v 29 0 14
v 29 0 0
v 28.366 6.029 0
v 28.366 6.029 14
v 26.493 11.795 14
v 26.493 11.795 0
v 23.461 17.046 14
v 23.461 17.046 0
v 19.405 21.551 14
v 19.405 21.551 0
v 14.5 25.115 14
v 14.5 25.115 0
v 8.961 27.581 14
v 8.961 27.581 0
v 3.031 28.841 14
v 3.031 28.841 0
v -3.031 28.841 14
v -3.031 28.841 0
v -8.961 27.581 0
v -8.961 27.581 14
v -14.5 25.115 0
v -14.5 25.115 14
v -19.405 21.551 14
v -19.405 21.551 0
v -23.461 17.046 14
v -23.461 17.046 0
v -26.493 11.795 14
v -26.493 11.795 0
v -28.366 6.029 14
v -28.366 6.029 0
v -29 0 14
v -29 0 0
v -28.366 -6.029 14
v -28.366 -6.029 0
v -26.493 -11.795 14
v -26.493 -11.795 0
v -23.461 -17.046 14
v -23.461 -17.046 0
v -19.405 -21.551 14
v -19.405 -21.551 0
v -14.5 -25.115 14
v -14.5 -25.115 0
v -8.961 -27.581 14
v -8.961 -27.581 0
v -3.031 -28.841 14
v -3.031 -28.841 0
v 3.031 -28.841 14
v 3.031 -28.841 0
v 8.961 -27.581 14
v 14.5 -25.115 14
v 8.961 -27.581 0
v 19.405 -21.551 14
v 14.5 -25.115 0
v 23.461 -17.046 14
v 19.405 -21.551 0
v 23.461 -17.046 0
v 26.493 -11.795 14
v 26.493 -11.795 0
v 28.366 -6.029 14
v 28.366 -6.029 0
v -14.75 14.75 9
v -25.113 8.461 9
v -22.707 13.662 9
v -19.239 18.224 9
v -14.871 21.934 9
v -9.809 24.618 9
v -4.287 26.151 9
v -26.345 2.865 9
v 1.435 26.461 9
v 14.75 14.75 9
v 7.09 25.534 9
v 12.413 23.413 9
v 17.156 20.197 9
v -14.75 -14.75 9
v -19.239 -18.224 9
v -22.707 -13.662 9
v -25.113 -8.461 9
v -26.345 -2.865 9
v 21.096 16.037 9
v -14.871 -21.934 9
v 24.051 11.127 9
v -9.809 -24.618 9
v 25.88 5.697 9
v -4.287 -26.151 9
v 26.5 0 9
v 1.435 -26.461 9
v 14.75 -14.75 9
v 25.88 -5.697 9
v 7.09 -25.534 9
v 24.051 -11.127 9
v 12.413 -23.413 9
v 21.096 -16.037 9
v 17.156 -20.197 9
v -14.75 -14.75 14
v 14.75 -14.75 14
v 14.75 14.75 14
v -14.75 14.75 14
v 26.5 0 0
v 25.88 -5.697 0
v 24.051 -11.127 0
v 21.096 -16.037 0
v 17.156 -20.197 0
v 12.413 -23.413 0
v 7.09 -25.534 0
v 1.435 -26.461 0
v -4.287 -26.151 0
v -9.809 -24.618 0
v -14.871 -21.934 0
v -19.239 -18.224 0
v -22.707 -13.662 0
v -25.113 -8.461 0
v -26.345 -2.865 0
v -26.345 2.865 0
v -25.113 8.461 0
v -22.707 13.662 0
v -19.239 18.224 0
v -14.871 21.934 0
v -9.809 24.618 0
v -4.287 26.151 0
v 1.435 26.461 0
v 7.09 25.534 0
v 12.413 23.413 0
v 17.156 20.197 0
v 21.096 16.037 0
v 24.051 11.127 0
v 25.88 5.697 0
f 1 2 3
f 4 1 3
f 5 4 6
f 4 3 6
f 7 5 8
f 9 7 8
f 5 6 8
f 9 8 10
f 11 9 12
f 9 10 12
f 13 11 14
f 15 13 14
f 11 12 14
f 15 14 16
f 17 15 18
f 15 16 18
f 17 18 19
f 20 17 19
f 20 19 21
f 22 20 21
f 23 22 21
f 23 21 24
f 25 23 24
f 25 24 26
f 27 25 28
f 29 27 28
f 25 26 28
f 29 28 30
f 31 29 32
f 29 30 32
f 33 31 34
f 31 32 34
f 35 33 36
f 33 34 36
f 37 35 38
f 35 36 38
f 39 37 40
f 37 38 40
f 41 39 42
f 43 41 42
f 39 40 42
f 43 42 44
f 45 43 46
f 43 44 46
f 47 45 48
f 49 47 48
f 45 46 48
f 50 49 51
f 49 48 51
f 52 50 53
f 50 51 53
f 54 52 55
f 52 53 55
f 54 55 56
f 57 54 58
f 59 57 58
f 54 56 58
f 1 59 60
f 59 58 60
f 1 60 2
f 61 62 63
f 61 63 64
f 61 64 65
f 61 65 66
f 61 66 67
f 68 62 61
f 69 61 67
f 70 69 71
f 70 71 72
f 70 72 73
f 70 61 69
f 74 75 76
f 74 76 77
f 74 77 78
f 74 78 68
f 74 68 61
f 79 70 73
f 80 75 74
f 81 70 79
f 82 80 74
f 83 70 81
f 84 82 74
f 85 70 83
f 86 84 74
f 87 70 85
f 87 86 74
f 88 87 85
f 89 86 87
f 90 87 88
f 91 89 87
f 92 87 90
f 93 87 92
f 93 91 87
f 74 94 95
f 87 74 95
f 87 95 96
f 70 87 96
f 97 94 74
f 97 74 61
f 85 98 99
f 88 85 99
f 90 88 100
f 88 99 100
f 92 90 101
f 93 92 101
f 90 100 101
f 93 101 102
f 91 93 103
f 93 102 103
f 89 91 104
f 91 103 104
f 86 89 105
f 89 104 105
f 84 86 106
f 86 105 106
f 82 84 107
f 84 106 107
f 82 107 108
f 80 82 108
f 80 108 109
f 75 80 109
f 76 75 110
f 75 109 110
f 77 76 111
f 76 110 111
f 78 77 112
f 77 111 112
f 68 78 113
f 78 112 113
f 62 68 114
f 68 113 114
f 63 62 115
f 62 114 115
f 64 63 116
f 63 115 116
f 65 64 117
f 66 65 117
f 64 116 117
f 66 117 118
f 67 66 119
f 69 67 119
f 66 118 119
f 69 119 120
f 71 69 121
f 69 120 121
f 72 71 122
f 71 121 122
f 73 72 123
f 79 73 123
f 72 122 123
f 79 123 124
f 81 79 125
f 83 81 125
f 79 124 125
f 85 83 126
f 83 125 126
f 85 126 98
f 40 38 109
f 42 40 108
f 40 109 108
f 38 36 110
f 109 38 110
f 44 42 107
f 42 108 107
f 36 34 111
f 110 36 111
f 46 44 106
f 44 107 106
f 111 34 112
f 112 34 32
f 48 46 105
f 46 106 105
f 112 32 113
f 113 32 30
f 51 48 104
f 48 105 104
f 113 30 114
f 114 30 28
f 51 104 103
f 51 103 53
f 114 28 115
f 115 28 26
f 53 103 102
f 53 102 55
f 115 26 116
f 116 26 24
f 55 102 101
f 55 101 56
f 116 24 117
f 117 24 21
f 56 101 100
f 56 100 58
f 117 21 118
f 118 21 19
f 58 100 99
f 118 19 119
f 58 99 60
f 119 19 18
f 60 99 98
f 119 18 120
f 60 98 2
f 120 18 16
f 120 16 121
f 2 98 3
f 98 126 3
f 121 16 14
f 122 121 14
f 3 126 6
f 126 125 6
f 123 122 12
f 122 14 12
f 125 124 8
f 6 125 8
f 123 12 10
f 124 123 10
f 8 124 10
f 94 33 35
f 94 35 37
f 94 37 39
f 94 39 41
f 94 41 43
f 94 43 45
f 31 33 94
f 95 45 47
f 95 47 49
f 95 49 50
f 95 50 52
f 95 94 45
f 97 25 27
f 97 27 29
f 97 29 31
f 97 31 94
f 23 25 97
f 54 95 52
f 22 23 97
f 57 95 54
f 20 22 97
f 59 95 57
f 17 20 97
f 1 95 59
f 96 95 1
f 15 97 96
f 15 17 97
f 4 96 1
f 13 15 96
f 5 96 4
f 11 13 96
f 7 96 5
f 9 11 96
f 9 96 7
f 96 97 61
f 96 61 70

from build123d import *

# Parameters (mm, degrees)
F0_R     = 29
F1_DEPTH = 14
F2_W     = 29.5
F2_H     = 29.5
F3_DEPTH = 25
F4_R     = 26.5
F5_DEPTH = 9


with BuildPart() as f1:
    # F0 (on Top) → F1 (new body)
    with BuildSketch(Plane.XY):
        Circle(F0_R)
    extrude(amount=F1_DEPTH)

    # F2 (on face) → F3 (cut)
    with BuildSketch(Plane.XY.offset(14)):
        Rectangle(F2_W, F2_H)
    extrude(amount=-F3_DEPTH, mode=Mode.SUBTRACT)

    # F4 (on face) → F5 (cut)
    with BuildSketch(Plane(origin=(0, 0, 0), x_dir=(1, 0, 0), z_dir=(0, 0, -1))):
        Circle(F4_R)
    extrude(amount=-F5_DEPTH, mode=Mode.SUBTRACT)


solid = f1.part
